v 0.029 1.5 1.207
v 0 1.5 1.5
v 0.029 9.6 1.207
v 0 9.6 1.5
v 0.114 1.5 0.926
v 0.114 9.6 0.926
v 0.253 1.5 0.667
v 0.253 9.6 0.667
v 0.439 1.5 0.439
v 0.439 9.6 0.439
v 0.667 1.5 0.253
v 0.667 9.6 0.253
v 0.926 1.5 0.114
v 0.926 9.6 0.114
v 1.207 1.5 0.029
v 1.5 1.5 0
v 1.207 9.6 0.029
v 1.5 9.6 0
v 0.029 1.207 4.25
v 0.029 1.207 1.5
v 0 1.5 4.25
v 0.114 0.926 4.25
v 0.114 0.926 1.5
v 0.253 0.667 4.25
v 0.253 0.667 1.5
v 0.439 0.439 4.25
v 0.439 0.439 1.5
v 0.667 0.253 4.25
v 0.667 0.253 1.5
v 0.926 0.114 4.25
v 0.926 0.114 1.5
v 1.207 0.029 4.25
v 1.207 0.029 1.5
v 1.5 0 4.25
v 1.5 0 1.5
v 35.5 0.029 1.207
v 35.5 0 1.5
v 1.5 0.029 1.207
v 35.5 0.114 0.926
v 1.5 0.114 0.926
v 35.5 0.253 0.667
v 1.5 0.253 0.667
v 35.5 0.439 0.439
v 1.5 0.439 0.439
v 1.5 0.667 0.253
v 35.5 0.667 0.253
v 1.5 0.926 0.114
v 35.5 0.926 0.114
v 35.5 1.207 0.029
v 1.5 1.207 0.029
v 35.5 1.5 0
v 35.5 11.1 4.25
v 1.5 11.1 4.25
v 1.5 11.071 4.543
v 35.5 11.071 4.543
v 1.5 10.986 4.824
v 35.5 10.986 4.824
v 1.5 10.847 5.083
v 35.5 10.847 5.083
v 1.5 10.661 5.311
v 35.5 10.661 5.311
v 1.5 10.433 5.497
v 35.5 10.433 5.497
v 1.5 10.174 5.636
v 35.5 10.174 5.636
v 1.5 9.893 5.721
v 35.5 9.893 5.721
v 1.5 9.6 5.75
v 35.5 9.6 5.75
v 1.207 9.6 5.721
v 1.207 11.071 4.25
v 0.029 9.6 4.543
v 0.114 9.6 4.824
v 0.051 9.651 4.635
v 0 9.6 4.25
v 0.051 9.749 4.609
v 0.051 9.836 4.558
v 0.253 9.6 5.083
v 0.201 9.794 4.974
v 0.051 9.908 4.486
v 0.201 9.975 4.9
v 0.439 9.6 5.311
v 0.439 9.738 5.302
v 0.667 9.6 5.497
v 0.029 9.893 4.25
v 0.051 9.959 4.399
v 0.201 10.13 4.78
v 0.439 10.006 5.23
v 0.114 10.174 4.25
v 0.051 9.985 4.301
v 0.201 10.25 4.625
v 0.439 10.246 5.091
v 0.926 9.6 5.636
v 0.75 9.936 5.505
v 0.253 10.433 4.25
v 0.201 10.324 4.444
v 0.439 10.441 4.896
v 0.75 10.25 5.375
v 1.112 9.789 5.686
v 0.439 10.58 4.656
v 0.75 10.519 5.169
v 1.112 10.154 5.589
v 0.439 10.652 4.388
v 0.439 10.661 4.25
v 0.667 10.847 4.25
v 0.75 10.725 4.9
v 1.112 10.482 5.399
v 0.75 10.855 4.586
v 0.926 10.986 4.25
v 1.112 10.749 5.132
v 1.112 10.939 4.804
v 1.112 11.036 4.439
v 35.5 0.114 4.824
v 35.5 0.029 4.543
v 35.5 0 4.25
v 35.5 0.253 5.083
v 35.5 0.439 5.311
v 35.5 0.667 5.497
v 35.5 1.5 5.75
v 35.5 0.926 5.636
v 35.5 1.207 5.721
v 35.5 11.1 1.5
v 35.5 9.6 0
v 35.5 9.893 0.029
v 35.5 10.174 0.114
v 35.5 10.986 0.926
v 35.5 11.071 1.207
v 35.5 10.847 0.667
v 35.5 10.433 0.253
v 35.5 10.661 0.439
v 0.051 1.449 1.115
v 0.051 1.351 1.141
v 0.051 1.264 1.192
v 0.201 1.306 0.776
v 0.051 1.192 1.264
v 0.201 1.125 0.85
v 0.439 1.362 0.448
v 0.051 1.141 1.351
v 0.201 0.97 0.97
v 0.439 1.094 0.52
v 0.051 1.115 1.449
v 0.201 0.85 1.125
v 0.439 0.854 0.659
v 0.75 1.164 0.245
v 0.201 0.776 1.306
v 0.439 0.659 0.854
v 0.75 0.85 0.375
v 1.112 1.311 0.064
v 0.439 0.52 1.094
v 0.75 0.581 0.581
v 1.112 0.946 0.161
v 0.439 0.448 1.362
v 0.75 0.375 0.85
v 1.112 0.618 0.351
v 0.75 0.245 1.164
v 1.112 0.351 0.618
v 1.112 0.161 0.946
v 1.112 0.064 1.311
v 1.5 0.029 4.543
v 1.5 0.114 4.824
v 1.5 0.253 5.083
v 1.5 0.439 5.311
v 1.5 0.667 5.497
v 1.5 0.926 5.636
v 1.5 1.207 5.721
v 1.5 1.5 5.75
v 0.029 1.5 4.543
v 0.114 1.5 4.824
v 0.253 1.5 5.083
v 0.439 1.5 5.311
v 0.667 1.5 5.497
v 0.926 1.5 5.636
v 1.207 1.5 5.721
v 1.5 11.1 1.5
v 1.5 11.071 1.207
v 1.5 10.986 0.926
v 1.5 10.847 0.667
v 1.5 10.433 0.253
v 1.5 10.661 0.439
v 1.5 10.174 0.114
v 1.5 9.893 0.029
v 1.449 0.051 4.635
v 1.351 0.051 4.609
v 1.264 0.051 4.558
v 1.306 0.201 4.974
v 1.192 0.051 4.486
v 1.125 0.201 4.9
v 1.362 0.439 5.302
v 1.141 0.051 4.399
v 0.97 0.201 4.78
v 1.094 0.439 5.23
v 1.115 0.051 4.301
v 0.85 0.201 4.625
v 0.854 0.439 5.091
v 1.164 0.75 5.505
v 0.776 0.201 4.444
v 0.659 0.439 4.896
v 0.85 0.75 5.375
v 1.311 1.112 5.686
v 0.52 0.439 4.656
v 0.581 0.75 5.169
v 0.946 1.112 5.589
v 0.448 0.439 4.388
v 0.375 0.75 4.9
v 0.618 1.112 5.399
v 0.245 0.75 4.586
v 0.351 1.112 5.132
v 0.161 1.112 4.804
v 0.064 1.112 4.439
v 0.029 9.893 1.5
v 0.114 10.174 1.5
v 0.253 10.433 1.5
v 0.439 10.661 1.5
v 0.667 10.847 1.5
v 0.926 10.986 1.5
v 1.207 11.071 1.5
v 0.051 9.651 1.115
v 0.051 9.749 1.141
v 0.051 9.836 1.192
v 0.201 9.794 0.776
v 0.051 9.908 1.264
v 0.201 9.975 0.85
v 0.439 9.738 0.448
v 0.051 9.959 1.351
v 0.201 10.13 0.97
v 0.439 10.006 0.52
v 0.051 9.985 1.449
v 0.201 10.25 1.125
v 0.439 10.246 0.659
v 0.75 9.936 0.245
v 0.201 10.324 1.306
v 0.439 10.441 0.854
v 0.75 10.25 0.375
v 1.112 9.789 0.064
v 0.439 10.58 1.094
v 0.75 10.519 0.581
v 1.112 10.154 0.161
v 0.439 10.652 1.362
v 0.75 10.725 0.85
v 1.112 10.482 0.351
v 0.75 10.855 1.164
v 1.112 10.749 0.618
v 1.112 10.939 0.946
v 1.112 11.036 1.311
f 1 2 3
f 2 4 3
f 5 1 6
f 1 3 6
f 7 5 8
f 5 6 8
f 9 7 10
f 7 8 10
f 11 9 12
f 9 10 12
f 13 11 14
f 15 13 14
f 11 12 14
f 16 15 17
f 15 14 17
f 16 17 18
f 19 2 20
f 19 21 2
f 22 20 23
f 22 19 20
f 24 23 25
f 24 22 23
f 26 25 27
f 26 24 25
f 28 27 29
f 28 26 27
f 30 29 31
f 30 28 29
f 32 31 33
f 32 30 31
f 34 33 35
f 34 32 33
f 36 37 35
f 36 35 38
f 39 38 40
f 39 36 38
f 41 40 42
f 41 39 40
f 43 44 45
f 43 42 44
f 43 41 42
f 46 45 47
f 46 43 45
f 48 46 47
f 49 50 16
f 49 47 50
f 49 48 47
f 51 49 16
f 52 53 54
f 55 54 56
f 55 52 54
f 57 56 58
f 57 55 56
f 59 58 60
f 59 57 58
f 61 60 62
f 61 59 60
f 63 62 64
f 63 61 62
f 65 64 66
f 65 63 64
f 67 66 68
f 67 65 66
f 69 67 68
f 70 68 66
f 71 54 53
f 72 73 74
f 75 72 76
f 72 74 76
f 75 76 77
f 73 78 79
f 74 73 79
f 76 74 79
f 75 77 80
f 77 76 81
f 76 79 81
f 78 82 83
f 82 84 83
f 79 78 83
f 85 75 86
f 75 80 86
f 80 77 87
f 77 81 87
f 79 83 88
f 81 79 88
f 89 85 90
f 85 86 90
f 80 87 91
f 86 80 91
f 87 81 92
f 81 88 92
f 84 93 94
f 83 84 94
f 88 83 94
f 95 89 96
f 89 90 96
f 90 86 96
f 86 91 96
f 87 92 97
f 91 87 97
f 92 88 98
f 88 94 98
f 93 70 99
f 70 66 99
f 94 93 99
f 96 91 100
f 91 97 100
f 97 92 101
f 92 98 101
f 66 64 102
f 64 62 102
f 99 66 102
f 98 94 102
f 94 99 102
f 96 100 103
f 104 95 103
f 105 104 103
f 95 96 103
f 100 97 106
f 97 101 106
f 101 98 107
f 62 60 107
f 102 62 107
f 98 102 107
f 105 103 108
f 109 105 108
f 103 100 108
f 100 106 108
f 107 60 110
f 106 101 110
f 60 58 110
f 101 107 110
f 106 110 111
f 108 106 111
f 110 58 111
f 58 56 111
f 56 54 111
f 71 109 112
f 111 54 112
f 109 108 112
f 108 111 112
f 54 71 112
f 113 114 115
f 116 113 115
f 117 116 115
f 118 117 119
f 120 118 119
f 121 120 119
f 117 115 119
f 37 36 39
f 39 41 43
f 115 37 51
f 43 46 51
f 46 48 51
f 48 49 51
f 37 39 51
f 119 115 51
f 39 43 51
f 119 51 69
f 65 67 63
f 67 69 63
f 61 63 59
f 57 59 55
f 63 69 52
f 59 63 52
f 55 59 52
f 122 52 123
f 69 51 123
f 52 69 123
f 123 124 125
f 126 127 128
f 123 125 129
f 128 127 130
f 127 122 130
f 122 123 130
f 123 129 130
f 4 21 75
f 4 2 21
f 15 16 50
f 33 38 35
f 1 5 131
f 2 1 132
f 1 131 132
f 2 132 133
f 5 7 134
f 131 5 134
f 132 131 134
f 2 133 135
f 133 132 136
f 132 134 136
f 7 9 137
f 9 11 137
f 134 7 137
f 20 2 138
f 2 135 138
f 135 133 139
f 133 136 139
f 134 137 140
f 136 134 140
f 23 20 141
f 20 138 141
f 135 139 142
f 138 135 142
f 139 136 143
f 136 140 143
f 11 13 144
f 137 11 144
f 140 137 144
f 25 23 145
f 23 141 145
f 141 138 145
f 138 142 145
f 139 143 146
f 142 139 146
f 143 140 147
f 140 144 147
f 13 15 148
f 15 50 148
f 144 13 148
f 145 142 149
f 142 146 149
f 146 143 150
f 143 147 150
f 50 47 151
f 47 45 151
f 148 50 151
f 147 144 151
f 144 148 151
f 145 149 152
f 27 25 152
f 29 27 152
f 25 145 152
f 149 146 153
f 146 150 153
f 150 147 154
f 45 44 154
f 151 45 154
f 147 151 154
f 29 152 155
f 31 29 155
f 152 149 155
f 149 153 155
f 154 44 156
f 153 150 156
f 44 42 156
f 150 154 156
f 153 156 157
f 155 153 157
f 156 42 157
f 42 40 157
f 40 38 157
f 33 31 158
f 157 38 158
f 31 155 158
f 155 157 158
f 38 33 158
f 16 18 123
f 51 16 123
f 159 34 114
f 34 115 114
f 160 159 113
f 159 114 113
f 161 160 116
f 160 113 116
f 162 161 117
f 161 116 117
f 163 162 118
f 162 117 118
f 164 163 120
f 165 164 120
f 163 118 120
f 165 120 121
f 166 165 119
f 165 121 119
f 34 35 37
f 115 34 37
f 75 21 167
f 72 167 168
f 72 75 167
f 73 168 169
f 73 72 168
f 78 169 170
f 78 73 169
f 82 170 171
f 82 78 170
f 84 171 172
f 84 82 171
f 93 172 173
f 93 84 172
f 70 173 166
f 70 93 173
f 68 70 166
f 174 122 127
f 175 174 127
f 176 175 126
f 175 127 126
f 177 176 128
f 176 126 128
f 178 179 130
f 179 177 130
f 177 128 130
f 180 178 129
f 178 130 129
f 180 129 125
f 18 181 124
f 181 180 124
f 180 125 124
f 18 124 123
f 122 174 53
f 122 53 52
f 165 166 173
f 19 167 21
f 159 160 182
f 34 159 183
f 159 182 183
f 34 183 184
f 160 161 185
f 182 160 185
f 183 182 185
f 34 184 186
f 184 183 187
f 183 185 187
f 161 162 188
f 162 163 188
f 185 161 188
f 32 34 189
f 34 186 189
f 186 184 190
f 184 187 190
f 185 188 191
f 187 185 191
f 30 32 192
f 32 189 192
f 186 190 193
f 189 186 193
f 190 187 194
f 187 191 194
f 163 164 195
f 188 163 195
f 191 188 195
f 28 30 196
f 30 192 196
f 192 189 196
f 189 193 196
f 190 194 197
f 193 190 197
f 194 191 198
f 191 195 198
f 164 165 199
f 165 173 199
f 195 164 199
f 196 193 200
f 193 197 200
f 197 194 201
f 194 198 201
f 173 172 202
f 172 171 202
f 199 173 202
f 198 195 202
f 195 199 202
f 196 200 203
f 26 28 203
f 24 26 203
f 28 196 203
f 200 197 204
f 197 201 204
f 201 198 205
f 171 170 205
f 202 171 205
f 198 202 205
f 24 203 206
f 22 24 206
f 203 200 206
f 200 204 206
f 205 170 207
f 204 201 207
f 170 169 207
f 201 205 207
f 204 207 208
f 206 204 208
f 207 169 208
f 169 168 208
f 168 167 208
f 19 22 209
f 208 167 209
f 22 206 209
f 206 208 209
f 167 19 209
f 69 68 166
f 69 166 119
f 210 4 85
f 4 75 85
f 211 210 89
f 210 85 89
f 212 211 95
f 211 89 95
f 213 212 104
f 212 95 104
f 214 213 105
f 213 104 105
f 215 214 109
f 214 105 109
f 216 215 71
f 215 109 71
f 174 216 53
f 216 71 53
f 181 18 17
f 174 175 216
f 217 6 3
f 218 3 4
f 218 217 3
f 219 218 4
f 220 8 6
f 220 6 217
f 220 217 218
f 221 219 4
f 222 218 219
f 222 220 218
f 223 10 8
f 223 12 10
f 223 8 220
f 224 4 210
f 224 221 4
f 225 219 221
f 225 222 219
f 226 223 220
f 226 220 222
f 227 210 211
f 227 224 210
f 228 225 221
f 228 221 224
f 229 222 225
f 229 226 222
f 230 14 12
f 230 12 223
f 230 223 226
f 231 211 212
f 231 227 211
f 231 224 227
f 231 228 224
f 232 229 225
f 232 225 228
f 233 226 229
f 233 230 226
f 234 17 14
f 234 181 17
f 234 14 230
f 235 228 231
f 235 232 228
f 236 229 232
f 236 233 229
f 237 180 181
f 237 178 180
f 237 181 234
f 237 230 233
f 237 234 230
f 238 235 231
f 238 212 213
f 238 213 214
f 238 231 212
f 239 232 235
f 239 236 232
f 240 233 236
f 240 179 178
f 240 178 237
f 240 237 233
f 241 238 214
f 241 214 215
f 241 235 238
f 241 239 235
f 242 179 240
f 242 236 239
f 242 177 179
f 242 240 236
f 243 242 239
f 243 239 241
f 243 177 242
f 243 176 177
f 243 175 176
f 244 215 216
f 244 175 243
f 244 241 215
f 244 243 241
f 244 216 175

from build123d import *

# Parameters (mm, degrees)
SKETCH1_W           = 35.5
SKETCH1_H           = 11.1
BOSS_EXTRUDE1_DEPTH = 5.75
FILLET1_R           = 1.5


with BuildPart() as part:
    # Sketch1 → Boss-Extrude1 (new body)
    with BuildSketch(Plane.XY):
        with Locations((17.75, 5.55)):
            Rectangle(SKETCH1_W, SKETCH1_H)
    extrude(amount=BOSS_EXTRUDE1_DEPTH)

    # Fillet1
    fillet1_edges = [part.edges().sort_by_distance(p)[0] for p in [
        (17.75, 11.1, 5.75),
        (0, 5.55, 5.75),
        (17.75, 11.1, 0),
        (17.75, 0, 0),
        (0, 5.55, 0),
        (17.75, 0, 5.75),
        (0, 11.1, 2.875),
        (0, 0, 2.875),
    ]]
    fillet(fillet1_edges, radius=FILLET1_R)


solid = part.part
